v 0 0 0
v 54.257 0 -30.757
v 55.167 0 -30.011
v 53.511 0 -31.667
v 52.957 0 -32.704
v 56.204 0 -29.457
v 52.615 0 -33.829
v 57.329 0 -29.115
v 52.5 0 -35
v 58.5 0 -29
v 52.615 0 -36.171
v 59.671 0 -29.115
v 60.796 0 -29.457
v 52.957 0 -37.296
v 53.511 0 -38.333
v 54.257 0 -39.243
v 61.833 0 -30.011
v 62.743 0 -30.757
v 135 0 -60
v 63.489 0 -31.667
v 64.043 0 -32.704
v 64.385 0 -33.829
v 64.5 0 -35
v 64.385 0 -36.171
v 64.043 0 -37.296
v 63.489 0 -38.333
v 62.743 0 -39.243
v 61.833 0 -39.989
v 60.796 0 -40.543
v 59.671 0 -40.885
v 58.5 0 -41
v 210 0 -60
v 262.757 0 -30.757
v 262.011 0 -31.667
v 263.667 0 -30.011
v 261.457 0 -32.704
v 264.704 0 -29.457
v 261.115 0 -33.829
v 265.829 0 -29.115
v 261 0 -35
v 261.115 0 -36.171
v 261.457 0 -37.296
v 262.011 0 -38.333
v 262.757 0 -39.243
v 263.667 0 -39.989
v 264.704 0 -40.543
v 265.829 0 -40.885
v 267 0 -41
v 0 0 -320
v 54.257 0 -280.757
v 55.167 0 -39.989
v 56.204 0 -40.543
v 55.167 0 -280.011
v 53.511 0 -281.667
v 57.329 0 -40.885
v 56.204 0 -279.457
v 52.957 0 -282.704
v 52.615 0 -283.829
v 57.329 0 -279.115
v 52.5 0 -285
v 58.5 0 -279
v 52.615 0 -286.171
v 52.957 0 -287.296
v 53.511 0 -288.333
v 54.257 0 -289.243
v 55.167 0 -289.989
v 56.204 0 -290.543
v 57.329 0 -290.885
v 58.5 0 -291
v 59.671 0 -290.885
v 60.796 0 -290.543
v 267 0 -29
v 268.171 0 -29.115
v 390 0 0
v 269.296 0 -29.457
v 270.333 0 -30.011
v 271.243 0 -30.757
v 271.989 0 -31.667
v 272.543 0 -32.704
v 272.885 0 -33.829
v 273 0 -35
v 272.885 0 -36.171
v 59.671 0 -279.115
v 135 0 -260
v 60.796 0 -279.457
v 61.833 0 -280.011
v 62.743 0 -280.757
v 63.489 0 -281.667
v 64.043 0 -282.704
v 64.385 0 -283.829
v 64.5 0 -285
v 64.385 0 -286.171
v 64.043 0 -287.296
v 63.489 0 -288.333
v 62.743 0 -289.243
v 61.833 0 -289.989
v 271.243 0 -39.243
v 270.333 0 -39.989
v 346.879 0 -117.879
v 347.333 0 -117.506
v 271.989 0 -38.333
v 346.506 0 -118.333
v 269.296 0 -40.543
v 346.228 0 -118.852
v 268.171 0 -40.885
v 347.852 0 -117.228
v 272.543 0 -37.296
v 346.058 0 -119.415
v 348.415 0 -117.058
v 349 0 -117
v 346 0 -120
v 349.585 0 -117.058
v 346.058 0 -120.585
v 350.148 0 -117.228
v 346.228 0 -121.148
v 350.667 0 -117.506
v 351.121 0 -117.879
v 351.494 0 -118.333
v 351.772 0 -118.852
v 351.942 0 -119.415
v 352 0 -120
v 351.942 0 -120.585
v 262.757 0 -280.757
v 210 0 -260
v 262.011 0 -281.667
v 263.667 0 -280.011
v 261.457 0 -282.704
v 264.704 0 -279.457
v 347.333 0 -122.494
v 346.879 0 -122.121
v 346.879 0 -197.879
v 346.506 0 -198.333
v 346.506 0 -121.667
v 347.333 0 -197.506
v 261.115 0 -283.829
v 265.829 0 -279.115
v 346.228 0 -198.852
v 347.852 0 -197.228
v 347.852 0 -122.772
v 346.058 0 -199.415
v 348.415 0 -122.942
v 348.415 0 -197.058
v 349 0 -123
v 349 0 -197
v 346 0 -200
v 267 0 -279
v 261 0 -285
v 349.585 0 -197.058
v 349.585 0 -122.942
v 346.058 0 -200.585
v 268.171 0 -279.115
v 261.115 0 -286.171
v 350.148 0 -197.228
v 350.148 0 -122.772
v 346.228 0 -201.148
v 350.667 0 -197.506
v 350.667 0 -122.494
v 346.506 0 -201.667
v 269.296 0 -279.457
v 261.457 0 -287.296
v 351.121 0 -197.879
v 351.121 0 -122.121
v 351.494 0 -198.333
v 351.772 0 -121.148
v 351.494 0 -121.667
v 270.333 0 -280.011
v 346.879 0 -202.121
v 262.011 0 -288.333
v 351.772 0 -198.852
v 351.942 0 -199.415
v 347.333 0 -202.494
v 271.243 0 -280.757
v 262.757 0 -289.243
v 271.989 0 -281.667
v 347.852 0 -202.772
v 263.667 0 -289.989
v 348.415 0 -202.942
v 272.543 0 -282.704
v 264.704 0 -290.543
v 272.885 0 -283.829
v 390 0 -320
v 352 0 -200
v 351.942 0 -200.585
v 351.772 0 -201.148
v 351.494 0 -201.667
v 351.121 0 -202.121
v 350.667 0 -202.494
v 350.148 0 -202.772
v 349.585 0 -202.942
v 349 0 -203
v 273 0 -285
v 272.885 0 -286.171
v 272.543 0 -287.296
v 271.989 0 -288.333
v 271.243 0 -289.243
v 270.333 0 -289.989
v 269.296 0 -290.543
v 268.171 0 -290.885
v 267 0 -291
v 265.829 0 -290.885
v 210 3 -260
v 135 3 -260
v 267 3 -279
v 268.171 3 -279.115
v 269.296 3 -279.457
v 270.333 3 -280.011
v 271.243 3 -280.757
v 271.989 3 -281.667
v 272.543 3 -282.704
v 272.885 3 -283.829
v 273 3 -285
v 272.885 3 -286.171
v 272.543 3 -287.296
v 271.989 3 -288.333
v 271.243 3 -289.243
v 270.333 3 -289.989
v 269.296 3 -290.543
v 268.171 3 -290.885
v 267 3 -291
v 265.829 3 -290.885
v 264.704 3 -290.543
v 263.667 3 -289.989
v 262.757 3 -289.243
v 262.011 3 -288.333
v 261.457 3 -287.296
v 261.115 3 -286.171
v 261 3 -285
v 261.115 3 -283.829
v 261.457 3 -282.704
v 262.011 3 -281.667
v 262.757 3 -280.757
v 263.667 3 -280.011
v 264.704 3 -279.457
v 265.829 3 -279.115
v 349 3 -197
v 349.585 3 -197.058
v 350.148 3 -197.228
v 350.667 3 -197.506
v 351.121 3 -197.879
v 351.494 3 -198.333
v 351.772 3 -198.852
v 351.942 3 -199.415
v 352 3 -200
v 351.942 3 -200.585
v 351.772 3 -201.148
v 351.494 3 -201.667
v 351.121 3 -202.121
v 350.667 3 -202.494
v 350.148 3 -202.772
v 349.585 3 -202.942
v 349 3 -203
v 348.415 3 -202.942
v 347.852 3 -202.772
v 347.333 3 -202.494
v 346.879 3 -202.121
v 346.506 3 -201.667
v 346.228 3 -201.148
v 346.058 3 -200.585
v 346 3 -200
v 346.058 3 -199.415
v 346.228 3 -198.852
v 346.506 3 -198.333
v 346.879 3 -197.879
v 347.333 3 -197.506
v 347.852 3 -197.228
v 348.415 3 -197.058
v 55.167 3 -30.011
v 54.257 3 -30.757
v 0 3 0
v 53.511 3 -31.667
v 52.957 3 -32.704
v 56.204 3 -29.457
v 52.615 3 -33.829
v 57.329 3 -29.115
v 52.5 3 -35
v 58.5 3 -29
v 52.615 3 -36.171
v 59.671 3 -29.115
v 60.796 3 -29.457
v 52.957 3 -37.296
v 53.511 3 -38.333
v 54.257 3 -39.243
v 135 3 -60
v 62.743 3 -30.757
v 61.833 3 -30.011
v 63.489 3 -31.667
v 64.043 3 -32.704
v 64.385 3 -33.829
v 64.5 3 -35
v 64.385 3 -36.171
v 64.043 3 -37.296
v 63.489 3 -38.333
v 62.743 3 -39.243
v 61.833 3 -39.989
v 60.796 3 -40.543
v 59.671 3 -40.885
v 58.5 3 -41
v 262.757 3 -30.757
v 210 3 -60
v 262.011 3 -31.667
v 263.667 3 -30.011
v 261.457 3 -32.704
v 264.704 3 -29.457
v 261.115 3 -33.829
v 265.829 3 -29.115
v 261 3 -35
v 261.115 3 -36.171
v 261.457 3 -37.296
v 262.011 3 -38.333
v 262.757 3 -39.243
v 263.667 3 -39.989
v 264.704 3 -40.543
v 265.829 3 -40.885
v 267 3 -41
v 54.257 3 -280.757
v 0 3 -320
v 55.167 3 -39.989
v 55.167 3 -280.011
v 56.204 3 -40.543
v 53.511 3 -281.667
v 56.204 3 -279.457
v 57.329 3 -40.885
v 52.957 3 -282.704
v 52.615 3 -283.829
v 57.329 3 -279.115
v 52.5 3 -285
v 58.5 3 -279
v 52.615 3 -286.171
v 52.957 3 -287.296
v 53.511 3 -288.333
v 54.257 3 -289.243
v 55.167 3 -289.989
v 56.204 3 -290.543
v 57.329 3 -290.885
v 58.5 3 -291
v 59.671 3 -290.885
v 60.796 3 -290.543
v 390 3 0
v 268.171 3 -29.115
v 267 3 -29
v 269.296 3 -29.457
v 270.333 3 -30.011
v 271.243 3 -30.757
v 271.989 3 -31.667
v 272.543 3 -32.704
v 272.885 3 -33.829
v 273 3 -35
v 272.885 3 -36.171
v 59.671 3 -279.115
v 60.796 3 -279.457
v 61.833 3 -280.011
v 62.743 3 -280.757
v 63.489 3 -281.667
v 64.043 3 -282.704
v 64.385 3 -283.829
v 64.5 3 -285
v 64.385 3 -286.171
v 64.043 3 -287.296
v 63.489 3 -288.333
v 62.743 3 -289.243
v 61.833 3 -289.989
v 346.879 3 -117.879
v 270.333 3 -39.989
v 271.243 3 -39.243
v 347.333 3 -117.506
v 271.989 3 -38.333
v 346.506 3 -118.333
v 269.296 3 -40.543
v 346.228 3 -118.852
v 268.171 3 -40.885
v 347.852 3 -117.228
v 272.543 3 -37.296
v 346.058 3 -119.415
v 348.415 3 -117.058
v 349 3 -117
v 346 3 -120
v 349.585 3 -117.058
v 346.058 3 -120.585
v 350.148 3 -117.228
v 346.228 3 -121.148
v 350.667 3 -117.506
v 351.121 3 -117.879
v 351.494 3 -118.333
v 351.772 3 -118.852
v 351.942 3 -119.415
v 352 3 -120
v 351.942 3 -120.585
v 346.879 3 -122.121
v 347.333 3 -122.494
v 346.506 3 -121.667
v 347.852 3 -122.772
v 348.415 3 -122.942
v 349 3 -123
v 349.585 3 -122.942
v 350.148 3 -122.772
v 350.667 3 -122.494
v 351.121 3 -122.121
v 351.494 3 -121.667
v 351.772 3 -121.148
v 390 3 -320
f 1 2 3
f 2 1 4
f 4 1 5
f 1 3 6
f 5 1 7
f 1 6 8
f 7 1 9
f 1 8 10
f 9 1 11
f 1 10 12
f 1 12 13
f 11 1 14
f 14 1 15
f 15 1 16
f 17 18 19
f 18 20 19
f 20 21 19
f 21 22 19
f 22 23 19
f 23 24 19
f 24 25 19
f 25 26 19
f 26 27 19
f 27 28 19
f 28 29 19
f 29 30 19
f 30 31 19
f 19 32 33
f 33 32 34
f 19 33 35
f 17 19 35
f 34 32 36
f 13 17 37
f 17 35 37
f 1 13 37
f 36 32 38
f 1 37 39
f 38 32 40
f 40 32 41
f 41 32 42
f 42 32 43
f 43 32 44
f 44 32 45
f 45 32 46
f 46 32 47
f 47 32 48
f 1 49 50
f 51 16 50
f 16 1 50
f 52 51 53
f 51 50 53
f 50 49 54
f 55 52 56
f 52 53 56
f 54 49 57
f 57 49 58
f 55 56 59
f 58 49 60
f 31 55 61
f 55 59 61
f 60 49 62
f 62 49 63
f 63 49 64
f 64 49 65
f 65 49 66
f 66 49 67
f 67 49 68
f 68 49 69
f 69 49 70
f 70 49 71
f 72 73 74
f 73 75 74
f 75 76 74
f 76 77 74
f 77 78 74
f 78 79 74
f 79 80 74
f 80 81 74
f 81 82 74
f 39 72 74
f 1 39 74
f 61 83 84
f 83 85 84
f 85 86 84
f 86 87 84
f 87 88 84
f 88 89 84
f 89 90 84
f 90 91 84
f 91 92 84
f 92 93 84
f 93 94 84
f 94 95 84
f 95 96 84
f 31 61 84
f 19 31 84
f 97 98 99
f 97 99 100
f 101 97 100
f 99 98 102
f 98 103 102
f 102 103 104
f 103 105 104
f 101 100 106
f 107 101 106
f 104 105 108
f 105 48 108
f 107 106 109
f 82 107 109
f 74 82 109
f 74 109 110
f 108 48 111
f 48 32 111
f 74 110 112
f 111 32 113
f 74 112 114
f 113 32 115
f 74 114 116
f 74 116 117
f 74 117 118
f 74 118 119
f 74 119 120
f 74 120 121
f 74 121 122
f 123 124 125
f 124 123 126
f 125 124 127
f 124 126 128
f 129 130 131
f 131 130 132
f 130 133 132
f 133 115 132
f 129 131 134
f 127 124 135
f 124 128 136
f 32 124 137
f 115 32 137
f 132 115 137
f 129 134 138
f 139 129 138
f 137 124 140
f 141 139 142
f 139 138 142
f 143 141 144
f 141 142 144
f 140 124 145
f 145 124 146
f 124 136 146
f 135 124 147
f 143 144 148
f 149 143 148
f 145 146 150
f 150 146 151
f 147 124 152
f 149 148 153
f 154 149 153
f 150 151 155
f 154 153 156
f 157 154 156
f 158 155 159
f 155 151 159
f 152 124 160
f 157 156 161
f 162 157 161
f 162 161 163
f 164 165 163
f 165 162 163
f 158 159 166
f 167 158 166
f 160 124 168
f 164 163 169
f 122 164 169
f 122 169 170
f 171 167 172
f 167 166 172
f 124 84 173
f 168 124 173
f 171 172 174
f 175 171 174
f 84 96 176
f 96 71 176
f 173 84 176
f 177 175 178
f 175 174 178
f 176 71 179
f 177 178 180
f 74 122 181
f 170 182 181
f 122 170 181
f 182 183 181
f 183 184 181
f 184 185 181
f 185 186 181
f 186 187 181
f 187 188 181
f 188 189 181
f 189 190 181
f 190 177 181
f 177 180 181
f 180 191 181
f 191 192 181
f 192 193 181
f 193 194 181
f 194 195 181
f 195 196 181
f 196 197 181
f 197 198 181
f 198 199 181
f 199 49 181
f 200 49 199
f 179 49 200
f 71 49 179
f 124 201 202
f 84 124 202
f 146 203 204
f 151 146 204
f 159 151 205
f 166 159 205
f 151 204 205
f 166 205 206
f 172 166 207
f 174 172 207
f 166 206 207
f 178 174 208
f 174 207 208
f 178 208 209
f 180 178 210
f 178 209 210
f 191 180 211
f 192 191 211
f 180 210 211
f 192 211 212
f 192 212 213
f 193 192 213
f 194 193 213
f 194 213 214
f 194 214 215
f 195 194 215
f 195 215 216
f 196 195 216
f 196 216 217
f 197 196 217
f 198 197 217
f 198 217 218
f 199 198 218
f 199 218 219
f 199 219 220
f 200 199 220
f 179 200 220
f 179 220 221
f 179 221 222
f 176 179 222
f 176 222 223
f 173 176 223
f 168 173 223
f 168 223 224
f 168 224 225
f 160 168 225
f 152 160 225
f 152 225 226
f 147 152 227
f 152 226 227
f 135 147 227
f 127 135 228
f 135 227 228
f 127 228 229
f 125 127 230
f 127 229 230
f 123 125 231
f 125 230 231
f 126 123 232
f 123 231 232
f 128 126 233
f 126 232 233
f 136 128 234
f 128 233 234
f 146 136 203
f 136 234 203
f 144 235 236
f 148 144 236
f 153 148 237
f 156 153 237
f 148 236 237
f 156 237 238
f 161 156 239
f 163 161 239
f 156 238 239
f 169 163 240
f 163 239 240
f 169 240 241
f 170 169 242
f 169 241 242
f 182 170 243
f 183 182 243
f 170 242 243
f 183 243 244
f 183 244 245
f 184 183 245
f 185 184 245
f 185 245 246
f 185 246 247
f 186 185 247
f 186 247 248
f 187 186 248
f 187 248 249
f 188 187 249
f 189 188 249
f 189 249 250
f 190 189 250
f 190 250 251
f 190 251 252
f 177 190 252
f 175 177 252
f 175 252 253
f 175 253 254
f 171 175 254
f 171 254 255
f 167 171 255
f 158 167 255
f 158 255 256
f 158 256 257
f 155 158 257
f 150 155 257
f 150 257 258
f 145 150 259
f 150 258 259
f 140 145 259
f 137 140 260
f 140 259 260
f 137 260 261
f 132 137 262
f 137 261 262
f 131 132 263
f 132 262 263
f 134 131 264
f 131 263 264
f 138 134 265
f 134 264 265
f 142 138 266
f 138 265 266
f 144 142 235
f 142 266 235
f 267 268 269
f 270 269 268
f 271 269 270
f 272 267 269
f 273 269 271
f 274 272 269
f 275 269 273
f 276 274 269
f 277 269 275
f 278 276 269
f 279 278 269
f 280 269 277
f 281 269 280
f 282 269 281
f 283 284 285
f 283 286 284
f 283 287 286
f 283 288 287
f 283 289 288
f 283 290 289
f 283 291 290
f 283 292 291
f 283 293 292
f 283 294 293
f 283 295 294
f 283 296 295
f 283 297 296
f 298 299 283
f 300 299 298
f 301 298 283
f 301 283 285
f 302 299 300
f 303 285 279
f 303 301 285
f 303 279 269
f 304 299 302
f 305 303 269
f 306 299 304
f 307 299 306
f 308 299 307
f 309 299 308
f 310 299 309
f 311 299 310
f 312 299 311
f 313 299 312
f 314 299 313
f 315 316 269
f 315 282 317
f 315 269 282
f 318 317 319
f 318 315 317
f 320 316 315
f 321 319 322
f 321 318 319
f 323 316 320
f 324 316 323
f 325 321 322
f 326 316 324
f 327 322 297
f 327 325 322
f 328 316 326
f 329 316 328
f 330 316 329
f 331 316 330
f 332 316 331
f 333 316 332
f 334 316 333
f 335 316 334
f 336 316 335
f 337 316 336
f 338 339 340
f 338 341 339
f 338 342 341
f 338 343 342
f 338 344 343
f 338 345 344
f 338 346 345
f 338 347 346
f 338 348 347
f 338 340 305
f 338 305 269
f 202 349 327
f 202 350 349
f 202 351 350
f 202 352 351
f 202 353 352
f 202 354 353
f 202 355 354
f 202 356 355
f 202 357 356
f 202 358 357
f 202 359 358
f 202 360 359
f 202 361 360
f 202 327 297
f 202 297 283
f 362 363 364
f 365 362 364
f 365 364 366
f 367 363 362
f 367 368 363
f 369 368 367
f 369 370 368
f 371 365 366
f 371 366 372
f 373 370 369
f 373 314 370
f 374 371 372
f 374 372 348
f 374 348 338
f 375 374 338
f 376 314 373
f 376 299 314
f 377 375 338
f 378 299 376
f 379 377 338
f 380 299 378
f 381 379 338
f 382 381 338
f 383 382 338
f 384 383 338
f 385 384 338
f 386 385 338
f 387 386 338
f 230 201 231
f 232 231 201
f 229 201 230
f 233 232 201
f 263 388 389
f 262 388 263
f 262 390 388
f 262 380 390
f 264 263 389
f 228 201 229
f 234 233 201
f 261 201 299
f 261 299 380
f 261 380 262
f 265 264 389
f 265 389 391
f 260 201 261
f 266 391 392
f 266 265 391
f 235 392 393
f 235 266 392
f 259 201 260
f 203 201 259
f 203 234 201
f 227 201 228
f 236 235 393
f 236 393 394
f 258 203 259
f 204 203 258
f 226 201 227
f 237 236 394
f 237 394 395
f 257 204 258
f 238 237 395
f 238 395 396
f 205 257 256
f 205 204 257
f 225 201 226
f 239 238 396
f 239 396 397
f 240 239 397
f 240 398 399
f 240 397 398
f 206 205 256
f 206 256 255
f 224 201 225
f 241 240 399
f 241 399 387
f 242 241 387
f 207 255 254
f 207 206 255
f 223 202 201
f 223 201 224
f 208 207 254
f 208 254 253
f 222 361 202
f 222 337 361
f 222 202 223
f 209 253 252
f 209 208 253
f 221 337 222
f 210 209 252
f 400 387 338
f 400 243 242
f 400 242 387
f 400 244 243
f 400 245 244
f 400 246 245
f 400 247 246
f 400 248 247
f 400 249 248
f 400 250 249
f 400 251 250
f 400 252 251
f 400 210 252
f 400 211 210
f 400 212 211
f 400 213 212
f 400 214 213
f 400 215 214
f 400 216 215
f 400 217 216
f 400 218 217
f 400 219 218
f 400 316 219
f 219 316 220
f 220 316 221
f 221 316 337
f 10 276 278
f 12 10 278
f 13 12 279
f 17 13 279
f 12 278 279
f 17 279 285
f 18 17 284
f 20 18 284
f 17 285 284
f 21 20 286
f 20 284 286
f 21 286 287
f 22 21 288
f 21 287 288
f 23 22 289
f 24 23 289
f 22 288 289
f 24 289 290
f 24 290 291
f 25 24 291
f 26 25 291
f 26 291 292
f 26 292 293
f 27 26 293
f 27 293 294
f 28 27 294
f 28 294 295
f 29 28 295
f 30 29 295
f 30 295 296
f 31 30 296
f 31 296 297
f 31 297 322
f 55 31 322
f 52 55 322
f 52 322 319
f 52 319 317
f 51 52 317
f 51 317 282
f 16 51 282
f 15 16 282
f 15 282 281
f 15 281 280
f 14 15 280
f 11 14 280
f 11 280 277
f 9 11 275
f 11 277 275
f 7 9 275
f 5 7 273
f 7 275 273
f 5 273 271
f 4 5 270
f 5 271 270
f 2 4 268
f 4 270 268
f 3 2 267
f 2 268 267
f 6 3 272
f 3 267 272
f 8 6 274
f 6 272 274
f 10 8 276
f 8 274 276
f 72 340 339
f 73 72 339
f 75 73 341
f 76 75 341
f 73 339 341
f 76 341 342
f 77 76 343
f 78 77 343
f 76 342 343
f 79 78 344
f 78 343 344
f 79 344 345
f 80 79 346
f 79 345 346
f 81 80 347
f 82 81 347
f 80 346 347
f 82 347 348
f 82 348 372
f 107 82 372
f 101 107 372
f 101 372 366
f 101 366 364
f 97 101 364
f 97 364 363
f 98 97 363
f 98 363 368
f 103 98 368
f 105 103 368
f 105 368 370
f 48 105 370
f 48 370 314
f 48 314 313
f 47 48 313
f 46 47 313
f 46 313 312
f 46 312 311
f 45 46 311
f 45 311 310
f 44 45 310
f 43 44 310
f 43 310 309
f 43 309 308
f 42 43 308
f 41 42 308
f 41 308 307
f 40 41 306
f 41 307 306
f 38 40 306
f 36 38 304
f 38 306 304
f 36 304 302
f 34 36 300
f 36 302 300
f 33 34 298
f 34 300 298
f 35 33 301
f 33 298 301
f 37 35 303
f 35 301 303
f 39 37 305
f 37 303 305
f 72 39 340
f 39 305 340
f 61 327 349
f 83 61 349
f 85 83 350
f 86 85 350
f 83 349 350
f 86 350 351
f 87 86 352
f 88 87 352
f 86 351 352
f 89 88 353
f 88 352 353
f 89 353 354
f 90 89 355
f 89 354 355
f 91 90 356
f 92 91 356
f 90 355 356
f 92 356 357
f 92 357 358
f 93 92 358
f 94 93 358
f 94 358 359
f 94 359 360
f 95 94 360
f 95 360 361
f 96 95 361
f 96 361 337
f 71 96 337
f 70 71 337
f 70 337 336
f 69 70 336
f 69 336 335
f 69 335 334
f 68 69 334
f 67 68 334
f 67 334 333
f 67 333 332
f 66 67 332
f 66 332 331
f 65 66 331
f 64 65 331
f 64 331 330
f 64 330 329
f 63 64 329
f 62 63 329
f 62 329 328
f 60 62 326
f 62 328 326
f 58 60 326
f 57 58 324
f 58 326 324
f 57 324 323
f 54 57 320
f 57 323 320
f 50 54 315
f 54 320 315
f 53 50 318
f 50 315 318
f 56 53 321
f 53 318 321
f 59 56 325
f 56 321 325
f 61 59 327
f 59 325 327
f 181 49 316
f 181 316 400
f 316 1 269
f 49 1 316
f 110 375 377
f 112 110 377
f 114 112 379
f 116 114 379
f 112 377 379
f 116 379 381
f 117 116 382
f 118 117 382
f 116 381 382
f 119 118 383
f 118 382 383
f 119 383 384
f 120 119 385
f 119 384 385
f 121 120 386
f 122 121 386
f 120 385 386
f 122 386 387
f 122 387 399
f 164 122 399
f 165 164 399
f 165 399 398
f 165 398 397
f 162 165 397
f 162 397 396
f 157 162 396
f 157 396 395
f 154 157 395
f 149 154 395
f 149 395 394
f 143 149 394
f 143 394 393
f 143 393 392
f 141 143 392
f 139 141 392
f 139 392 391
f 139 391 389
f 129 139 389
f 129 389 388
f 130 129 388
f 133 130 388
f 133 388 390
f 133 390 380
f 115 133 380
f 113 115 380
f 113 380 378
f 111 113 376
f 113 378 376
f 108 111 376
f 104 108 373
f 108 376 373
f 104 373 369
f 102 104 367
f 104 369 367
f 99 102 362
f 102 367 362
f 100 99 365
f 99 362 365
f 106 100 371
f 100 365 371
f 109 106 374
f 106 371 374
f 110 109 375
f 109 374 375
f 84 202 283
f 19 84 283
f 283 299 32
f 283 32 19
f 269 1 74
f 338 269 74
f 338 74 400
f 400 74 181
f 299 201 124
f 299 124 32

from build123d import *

# Parameters (mm, degrees)
ESQUISSE1_W             = 390
ESQUISSE1_H             = 320
BASE_EXTRUSION_DEPTH    = 3
ESQUISSE2_W             = 75
ESQUISSE2_H             = 200
ENL_V_MAT_EXTRU_1_DEPTH = 4
ESQUISSE3_R             = 6
ENL_V_MAT_EXTRU_2_DEPTH = 4
ESQUISSE4_R             = 3
ENL_V_MAT_EXTRU_3_DEPTH = 10


with BuildPart() as part:
    # Esquisse1 → Base-Extrusion (new body)
    with BuildSketch(Plane(origin=(0, 0, 0), x_dir=(1, 0, 0), z_dir=(0, 1, 0))):
        with Locations((195, 160)):
            Rectangle(ESQUISSE1_W, ESQUISSE1_H)
    extrude(amount=BASE_EXTRUSION_DEPTH)

    # Esquisse2 → Enlèv. mat.-Extru.1 (cut)
    with BuildSketch(Plane(origin=(0, 3, 0), x_dir=(-1, 0, 0), z_dir=(0, 1, 0))):
        with Locations((-172.5, -160)):
            Rectangle(ESQUISSE2_W, ESQUISSE2_H)
    extrude(amount=-ENL_V_MAT_EXTRU_1_DEPTH, mode=Mode.SUBTRACT)

    # Esquisse3 → Enlèv. mat.-Extru.2 (cut)
    with BuildSketch(Plane(origin=(0, 3, 0), x_dir=(-1, 0, 0), z_dir=(0, 1, 0))):
        with Locations(Location((-267, -285, 0), (0, 0, 90))):
            Circle(ESQUISSE3_R)
        with Locations(Location((-58.5, -285, 0), (0, 0, 90))):
            Circle(ESQUISSE3_R)
        with Locations(Location((-267, -35, 0), (0, 0, 90))):
            Circle(ESQUISSE3_R)
        with Locations(Location((-58.5, -35, 0), (0, 0, 90))):
            Circle(ESQUISSE3_R)
    extrude(amount=-ENL_V_MAT_EXTRU_2_DEPTH, mode=Mode.SUBTRACT)

    # Esquisse4 → Enlèv. mat.-Extru.3 (cut)
    with BuildSketch(Plane(origin=(0, 3, 0), x_dir=(-1, 0, 0), z_dir=(0, 1, 0))):
        with Locations(Location((-349, -200, 0), (0, 0, 90))):
            Circle(ESQUISSE4_R)
        with Locations(Location((-349, -120, 0), (0, 0, 90))):
            Circle(ESQUISSE4_R)
    extrude(amount=-ENL_V_MAT_EXTRU_3_DEPTH, mode=Mode.SUBTRACT)


solid = part.part
